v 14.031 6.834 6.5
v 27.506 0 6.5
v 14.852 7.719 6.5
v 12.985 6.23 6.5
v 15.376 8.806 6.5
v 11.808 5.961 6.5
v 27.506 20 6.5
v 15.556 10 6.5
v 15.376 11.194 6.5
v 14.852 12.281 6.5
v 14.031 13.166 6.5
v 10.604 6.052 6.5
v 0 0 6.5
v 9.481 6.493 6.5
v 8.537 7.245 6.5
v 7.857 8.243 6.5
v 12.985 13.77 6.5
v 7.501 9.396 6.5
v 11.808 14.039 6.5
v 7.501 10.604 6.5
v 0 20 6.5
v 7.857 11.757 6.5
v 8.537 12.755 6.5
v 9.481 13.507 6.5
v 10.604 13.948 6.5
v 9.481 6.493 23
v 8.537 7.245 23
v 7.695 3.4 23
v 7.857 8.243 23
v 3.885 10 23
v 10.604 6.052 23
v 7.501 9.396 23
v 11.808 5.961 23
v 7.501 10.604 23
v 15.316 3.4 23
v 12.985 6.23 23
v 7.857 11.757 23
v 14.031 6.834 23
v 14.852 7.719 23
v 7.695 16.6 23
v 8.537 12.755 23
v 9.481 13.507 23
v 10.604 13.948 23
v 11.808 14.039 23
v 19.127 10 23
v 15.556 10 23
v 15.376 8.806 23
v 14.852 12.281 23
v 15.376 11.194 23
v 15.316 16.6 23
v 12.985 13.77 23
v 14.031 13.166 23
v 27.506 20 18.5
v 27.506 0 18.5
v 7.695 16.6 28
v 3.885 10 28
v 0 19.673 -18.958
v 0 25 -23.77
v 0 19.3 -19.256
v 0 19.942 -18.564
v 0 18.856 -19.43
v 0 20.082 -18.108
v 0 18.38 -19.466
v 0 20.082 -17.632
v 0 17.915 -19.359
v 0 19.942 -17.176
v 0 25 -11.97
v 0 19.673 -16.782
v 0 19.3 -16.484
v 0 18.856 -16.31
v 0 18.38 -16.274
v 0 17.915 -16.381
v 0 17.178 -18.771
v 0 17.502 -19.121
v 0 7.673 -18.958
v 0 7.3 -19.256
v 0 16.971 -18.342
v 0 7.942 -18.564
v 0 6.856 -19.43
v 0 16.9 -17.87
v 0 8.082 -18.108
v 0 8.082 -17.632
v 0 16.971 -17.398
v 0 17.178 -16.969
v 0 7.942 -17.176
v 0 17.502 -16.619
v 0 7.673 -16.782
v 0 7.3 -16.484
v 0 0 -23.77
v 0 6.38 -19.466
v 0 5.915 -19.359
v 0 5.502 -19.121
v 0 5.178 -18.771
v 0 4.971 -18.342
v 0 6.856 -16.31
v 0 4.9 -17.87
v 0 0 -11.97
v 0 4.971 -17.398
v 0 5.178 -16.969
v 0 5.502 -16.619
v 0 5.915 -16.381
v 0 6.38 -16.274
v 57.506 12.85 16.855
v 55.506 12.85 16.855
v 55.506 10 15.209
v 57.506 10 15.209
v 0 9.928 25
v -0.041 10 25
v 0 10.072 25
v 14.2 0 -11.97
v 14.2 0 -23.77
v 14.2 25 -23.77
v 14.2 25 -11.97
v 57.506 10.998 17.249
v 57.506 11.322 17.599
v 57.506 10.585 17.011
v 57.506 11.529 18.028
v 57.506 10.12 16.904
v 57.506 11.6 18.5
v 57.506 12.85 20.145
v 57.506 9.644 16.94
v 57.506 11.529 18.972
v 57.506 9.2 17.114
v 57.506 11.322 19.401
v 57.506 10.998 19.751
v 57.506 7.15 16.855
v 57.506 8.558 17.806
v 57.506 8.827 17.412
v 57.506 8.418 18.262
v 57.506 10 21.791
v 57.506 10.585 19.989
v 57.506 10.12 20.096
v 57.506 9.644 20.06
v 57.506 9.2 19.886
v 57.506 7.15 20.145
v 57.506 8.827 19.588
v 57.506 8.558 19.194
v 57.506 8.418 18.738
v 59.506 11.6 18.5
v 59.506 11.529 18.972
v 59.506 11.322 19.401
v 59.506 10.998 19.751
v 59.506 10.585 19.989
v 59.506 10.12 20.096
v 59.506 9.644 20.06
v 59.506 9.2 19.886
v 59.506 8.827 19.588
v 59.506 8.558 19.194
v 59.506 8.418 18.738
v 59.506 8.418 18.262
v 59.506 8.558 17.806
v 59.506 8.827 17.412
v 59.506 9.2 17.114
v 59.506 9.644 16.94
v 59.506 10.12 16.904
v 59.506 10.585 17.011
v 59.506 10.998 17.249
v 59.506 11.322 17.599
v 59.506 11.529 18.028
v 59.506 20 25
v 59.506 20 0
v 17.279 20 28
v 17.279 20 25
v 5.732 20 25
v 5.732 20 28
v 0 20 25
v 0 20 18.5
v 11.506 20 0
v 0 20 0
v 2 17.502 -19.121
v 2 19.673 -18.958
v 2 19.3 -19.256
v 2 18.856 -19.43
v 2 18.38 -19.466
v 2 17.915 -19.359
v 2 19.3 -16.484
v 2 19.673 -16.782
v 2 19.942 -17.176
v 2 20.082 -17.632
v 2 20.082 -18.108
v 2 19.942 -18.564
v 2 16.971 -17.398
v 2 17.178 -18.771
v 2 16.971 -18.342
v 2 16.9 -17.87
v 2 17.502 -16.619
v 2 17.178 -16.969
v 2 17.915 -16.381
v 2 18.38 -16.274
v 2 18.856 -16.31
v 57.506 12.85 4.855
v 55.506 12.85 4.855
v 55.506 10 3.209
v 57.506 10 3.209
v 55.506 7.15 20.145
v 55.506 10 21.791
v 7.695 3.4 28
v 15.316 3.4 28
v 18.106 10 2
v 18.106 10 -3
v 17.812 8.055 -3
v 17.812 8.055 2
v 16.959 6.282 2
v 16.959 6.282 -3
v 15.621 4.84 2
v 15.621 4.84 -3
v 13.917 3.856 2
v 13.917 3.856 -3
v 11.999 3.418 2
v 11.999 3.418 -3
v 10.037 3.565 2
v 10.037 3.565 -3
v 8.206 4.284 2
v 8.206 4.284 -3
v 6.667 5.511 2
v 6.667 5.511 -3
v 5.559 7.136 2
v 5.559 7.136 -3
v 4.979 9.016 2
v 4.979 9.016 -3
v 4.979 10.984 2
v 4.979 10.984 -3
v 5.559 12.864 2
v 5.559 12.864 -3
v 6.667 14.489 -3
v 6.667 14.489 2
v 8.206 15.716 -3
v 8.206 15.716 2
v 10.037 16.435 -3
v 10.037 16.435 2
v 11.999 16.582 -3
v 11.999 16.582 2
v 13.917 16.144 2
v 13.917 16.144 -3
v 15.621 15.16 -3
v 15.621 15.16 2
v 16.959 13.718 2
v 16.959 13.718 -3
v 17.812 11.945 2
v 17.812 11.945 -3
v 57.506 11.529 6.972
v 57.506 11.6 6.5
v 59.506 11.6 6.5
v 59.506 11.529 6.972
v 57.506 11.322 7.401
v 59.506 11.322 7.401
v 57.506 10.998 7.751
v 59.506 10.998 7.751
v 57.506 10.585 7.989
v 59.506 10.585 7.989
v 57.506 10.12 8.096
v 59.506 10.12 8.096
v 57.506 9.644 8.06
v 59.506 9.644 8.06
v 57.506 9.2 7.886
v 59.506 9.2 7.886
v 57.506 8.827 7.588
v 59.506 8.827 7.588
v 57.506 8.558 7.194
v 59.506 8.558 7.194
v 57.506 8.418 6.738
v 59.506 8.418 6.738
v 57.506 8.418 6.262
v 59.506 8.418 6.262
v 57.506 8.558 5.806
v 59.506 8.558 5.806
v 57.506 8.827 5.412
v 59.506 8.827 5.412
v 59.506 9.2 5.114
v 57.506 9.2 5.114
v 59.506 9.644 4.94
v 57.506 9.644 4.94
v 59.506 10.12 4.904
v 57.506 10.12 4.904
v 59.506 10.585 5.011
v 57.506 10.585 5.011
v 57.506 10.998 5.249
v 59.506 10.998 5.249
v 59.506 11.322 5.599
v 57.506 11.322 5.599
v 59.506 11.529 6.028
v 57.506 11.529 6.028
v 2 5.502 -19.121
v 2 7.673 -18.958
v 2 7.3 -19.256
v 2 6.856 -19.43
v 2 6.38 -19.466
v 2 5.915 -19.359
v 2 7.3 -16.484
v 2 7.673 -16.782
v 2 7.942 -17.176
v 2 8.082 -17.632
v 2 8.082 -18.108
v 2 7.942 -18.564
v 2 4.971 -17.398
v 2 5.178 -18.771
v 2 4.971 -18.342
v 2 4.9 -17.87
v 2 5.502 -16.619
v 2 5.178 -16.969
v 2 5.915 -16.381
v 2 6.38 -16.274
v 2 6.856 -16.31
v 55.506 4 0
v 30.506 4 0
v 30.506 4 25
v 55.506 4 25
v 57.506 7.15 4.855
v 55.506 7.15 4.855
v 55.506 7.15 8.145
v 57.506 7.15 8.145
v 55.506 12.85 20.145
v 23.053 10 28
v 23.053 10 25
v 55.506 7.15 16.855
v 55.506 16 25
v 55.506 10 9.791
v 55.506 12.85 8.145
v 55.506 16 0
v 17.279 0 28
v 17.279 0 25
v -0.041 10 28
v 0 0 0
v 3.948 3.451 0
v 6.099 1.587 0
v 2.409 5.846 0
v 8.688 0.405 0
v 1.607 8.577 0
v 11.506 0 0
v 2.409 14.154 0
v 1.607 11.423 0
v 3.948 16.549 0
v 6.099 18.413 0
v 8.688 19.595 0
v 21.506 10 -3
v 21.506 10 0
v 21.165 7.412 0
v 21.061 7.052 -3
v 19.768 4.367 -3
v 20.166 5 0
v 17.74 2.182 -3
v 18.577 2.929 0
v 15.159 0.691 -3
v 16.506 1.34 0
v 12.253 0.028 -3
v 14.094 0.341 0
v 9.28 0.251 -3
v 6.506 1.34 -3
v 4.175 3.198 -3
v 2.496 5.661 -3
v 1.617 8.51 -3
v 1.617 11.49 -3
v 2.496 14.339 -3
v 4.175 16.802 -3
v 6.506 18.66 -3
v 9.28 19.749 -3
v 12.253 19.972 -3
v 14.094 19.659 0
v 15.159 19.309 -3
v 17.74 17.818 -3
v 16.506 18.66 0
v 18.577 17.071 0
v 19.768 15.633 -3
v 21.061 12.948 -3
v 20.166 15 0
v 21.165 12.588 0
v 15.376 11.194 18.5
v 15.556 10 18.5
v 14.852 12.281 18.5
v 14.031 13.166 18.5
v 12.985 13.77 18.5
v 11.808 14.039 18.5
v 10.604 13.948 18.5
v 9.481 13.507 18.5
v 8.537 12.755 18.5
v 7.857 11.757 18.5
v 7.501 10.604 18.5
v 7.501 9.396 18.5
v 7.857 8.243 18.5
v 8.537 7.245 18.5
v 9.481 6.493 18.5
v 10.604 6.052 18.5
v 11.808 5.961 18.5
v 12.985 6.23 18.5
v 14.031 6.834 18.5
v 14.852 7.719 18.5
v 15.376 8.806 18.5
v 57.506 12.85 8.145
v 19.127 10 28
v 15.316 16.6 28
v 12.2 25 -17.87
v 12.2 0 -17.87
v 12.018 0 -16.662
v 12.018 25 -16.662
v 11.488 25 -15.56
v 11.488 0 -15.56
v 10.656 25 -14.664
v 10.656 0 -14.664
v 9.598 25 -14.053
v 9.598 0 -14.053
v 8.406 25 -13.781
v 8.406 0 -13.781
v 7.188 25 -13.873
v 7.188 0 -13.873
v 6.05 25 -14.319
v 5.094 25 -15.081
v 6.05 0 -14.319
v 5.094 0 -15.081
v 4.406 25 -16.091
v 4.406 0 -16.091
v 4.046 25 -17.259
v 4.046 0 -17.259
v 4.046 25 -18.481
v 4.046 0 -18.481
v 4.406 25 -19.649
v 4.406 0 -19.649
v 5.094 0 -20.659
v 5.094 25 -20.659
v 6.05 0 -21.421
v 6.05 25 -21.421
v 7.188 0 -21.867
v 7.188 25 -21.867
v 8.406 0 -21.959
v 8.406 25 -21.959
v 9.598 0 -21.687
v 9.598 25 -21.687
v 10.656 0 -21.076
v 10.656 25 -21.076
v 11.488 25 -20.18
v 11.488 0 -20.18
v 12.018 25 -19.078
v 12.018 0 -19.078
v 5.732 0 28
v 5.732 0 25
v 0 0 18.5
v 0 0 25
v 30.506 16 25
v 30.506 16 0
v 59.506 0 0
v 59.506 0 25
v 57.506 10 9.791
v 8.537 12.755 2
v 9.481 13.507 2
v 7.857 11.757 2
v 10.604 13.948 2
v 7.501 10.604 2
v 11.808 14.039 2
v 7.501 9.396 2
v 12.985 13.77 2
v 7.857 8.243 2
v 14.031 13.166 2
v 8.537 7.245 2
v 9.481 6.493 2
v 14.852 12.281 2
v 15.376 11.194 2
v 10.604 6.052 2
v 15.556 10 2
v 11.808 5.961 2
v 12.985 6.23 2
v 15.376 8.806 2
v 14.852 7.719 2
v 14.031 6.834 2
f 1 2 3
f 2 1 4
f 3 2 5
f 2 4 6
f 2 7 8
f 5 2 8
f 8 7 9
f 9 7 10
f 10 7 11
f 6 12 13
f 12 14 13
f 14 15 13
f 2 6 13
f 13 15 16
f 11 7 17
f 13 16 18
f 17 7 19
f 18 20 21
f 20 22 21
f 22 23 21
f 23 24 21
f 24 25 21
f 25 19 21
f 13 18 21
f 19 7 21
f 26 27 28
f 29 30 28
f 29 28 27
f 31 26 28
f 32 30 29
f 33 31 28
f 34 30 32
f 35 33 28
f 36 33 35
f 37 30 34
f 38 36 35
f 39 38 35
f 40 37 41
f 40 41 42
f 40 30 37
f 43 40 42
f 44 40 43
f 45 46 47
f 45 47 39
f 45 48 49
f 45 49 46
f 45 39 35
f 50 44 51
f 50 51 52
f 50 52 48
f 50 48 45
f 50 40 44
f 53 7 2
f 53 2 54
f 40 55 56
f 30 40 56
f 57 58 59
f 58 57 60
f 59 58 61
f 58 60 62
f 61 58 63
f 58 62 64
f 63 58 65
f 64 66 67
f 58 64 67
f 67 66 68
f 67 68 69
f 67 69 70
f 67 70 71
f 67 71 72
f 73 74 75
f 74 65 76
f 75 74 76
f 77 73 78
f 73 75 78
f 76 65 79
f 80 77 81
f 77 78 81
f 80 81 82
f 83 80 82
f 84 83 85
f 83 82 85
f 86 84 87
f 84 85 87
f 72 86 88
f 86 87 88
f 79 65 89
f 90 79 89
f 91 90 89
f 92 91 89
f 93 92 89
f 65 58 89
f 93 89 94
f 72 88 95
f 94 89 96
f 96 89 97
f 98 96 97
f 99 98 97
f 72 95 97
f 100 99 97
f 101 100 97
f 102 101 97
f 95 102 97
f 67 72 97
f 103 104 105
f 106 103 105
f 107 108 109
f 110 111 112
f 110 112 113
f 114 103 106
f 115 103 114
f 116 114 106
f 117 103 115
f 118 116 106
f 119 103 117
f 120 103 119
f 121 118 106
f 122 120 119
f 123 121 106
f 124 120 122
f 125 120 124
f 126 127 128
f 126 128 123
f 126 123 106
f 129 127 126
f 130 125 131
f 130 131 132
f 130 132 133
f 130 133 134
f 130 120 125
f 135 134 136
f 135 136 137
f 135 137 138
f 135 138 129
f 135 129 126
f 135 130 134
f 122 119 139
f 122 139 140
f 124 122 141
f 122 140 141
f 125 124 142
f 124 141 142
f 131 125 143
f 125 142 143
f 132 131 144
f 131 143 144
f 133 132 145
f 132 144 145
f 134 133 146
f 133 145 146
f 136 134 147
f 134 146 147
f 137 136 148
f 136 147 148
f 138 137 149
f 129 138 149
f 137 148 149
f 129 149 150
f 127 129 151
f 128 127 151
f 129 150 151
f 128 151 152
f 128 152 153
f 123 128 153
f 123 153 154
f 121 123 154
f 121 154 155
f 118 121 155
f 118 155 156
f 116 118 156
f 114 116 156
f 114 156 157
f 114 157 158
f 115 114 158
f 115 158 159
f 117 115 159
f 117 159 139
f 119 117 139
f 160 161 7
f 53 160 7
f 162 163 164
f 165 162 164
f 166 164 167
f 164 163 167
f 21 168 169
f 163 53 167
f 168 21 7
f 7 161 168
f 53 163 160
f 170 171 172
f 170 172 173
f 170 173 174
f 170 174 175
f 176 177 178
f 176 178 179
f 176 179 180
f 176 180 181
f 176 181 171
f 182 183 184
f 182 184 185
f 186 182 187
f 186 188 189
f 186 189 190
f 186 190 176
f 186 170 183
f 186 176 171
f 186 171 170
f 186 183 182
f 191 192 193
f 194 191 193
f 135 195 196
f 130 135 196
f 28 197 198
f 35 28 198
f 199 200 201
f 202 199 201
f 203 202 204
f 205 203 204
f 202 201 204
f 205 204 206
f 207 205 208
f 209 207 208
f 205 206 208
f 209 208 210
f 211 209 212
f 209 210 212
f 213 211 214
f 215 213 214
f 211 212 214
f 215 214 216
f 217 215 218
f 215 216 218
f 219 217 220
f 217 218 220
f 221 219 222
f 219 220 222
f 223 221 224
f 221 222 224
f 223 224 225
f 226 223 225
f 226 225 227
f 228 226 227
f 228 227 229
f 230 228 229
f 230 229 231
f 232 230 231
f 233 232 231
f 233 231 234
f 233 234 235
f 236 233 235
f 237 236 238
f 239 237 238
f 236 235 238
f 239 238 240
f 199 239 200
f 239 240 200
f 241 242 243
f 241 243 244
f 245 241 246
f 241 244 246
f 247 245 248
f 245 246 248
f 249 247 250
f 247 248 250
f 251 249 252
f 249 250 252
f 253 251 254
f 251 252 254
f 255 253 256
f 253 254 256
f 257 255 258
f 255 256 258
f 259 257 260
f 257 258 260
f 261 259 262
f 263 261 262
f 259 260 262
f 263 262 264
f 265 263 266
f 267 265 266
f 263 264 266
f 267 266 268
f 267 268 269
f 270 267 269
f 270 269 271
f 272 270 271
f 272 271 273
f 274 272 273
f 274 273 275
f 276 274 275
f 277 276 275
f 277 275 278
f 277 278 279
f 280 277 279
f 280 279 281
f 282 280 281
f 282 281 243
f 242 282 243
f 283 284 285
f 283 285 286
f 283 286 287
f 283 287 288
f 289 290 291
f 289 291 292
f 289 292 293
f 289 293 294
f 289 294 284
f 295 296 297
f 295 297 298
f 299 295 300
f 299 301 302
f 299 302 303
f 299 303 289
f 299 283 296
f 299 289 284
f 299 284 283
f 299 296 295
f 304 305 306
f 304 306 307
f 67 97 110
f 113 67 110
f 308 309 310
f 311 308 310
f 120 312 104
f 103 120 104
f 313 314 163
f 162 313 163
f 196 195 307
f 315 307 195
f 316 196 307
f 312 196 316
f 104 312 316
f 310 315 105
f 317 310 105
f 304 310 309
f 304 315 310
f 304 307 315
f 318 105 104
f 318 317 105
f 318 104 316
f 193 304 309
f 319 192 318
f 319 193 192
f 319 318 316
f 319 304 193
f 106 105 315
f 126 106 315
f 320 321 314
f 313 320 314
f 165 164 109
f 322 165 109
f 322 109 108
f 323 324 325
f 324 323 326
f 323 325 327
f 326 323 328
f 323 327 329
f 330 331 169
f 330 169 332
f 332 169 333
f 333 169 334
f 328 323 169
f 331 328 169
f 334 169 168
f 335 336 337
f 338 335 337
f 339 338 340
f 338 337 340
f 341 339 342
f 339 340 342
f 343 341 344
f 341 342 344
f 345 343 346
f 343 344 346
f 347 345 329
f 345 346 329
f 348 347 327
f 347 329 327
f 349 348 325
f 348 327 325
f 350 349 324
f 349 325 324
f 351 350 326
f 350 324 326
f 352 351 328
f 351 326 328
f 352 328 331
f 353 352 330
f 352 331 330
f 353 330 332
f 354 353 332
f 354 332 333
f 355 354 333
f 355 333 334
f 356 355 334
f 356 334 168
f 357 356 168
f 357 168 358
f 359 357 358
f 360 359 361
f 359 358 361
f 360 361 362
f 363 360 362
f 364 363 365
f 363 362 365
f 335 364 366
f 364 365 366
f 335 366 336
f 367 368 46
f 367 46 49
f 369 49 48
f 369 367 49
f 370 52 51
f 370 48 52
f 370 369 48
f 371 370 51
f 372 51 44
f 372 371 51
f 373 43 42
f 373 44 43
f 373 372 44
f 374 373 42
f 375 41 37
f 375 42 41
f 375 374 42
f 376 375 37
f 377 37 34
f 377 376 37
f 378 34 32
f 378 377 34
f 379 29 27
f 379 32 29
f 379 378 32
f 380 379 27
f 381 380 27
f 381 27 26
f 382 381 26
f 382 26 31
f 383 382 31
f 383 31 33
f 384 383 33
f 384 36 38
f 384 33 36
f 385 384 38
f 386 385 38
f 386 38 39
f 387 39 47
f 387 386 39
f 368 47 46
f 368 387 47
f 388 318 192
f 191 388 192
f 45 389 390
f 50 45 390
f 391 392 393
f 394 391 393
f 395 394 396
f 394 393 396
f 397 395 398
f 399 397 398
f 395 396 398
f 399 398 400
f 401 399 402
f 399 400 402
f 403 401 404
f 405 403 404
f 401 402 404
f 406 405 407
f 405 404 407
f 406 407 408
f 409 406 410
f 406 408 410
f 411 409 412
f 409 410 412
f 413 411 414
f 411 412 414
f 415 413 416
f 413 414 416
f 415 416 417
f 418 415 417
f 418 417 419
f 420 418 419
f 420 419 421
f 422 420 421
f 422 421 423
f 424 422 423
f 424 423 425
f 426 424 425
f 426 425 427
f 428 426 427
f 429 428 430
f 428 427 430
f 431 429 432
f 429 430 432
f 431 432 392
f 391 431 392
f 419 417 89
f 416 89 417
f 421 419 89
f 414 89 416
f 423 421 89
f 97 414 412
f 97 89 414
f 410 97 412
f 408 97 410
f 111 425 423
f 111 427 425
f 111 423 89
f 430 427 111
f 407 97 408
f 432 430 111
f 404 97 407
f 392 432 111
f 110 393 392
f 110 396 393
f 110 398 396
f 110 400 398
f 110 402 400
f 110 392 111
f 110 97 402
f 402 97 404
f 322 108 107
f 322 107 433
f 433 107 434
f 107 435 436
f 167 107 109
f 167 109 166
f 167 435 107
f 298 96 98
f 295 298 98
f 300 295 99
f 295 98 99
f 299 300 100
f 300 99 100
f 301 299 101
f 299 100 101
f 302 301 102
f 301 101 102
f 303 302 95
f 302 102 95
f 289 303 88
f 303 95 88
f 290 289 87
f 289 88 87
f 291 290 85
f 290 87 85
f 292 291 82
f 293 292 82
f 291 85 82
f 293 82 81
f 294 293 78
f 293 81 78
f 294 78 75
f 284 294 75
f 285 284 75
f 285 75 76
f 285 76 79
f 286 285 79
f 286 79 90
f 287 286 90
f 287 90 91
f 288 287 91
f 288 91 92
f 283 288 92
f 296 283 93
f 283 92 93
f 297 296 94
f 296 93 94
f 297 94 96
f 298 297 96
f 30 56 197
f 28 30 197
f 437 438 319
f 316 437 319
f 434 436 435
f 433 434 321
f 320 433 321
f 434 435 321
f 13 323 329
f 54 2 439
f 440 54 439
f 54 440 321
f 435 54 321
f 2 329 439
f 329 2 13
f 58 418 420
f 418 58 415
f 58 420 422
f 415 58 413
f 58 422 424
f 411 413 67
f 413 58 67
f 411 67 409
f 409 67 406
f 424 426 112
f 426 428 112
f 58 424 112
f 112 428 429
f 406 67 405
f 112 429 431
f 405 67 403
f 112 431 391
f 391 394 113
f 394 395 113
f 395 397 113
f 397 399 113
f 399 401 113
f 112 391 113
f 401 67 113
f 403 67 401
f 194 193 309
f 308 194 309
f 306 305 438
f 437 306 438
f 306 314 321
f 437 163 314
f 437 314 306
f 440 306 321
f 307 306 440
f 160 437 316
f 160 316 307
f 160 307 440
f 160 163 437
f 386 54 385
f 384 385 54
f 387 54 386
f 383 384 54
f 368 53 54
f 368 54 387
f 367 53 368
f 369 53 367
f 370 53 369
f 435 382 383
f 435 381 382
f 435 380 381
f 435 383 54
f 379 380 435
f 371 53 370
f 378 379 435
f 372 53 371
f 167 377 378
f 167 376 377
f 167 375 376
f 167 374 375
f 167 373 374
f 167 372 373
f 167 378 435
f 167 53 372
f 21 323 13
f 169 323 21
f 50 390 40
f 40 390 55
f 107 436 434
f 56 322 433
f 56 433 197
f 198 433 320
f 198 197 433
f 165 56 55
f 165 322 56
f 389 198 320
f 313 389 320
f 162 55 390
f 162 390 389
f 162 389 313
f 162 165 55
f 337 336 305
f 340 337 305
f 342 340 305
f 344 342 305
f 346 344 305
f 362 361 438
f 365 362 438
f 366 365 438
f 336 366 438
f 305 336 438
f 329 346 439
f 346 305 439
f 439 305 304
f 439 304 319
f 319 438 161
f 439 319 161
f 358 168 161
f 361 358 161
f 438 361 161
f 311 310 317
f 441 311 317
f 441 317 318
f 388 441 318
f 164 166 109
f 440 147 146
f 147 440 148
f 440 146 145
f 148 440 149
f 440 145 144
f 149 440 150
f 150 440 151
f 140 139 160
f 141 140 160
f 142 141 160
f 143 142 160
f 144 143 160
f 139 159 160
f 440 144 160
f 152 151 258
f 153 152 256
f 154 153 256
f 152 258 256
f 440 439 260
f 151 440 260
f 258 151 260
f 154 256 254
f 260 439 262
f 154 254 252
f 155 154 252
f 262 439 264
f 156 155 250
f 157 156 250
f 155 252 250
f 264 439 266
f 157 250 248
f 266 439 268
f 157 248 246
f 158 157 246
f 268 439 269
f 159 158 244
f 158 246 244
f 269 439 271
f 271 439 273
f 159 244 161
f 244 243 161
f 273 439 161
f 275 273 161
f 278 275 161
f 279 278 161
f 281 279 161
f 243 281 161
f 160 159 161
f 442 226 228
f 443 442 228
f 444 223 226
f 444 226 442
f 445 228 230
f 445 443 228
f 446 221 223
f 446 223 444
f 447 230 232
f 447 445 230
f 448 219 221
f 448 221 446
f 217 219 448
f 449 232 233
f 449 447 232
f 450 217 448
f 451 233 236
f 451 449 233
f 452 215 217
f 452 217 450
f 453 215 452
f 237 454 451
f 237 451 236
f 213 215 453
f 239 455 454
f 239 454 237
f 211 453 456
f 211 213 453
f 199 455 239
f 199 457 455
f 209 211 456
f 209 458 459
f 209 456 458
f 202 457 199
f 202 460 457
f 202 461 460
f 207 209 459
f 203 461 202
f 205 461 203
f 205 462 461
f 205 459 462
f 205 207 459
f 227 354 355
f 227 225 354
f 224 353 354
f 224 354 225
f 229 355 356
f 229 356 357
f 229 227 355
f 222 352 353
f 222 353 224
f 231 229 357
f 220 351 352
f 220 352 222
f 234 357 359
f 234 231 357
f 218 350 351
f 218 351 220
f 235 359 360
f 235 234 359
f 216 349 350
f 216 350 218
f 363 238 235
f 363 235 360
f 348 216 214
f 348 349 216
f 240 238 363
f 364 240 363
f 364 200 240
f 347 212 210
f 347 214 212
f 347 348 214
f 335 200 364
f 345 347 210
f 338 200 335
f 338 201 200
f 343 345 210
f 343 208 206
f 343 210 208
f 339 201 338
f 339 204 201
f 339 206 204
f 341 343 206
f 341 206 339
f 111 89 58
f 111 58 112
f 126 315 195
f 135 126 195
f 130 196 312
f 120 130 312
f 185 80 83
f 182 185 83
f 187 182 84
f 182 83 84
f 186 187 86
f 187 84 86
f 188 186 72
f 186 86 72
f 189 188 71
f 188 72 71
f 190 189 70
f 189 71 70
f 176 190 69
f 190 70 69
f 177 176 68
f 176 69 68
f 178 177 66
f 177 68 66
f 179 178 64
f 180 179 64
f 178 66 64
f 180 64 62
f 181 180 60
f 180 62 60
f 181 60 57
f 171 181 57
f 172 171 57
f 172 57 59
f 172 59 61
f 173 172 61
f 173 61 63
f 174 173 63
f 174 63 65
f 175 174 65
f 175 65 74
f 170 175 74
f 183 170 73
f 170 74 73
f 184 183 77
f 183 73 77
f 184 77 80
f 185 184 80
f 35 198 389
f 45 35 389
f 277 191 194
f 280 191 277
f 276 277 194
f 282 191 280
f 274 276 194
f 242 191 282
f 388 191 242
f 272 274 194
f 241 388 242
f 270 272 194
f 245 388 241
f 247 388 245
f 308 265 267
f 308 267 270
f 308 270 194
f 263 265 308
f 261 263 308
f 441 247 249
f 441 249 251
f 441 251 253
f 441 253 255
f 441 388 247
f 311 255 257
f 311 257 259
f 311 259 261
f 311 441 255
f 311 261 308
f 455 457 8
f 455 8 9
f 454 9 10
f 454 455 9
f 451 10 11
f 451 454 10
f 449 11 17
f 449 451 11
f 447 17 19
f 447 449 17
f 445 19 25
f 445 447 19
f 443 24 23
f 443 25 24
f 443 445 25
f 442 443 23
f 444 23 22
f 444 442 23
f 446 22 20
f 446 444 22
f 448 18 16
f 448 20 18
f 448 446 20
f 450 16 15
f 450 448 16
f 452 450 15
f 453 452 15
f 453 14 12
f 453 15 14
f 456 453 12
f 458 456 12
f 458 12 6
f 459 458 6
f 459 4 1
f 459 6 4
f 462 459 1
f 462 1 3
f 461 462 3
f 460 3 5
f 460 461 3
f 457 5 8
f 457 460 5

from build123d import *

# Parameters (mm, degrees)
F0_W      = 59.505553
F0_H      = 20
F0_R      = 4.05
F0_W_2    = 25
F0_H_2    = 12
F1_DEPTH  = 25
F2_W      = 27.505553
F2_H      = 12
F3_DEPTH  = 25
F5_DEPTH  = 3
F7_DEPTH  = 5
F8_R      = 10
F9_DEPTH  = 3
F10_R     = 6.6
F11_DEPTH = 5
F12_R     = 1.6
F13_DEPTH = 4
F14_W     = 14.2
F14_H     = 11.8
F14_R     = 4.1
F15_DEPTH = 25
F16_R     = 1.6
F17_DEPTH = 2
F19_DEPTH = 2


with BuildPart() as f1:
    # F0 (on Top) → F1 (new body)
    with BuildSketch(Plane.XY):
        with Locations((29.752776, 10)):
            Rectangle(F0_W, F0_H)
        with Locations((11.505553, 10)):
            Circle(F0_R, mode=Mode.SUBTRACT)
        with Locations((43.005553, 10)):
            Rectangle(F0_W_2, F0_H_2, mode=Mode.SUBTRACT)
    extrude(amount=F1_DEPTH)

    # F2 (on face) → F3 (cut)
    with BuildSketch(Plane(origin=(0, 20, 0), x_dir=(-1, 0, 0), z_dir=(0, 1, 0))):
        with Locations((-13.752776, 12.5)):
            Rectangle(F2_W, F2_H)
    extrude(amount=-F3_DEPTH, mode=Mode.SUBTRACT)

    # F4 (on face) → F5 (join)
    with BuildSketch(Plane.XY.offset(25)):
        Polygon((17.279056, 20), (5.732051, 20), (-0.041452, 10), (5.732051, 0), (17.279056, 0), (23.052559, 10), align=None)
    extrude(amount=F5_DEPTH)

    # F6 (on face) → F7 (cut)
    with BuildSketch(Plane.XY.offset(28)):
        Polygon((7.695042, 16.6), (3.88453, 10), (7.695042, 3.4), (15.316065, 3.4), (19.126577, 10), (15.316065, 16.6), align=None)
    extrude(amount=-F7_DEPTH, mode=Mode.SUBTRACT)

    # F8 (on face) → F9 (join)
    with BuildSketch(Plane(origin=(0, 0, 0), x_dir=(1, 0, 0), z_dir=(0, 0, -1))):
        with Locations((11.505553, -10)):
            Circle(F8_R)
    extrude(amount=F9_DEPTH)

    # F10 (on face) → F11 (cut)
    with BuildSketch(Plane(origin=(0, 0, -3), x_dir=(1, 0, 0), z_dir=(0, 0, -1))):
        with Locations((11.505553, -10)):
            Circle(F10_R)
    extrude(amount=-F11_DEPTH, mode=Mode.SUBTRACT)

    # F12 (on face) → F13 (cut, through all)
    with BuildSketch(Plane.YZ.offset(59.505553)):
        with Locations((10, 6.5)):
            Circle(F12_R)
        with Locations((10, 18.5)):
            Circle(F12_R)
    extrude(amount=-F13_DEPTH, mode=Mode.SUBTRACT)

    # F18 (on face) → F19 (cut)
    with BuildSketch(Plane(origin=(55.505553, 0, 0), x_dir=(0, -1, 0), z_dir=(-1, 0, 0))):
        Polygon((-12.85, 8.145448), (-12.85, 4.854552), (-10, 3.209103), (-7.15, 4.854552), (-7.15, 8.145448), (-10, 9.790897), align=None)
        Polygon((-12.85, 20.145448), (-12.85, 16.854552), (-10, 15.209103), (-7.15, 16.854552), (-7.15, 20.145448), (-10, 21.790897), align=None)
    extrude(amount=-F19_DEPTH, mode=Mode.SUBTRACT)


with BuildPart() as f15:
    # F14 (on Front) → F15 (new body)
    with BuildSketch(Plane.XZ):
        with Locations((7.1, -17.87)):
            Rectangle(F14_W, F14_H)
        with Locations((8.1, -17.87)):
            Circle(F14_R, mode=Mode.SUBTRACT)
    extrude(amount=-F15_DEPTH)

    # F16 (on face) → F17 (cut)
    with BuildSketch(Plane(origin=(0, 0, 0), x_dir=(0, -1, 0), z_dir=(-1, 0, 0))):
        with Locations((-18.5, -17.87)):
            Circle(F16_R)
        with Locations((-6.5, -17.87)):
            Circle(F16_R)
    extrude(amount=-F17_DEPTH, mode=Mode.SUBTRACT)


solid = Compound([f1.part, f15.part])
